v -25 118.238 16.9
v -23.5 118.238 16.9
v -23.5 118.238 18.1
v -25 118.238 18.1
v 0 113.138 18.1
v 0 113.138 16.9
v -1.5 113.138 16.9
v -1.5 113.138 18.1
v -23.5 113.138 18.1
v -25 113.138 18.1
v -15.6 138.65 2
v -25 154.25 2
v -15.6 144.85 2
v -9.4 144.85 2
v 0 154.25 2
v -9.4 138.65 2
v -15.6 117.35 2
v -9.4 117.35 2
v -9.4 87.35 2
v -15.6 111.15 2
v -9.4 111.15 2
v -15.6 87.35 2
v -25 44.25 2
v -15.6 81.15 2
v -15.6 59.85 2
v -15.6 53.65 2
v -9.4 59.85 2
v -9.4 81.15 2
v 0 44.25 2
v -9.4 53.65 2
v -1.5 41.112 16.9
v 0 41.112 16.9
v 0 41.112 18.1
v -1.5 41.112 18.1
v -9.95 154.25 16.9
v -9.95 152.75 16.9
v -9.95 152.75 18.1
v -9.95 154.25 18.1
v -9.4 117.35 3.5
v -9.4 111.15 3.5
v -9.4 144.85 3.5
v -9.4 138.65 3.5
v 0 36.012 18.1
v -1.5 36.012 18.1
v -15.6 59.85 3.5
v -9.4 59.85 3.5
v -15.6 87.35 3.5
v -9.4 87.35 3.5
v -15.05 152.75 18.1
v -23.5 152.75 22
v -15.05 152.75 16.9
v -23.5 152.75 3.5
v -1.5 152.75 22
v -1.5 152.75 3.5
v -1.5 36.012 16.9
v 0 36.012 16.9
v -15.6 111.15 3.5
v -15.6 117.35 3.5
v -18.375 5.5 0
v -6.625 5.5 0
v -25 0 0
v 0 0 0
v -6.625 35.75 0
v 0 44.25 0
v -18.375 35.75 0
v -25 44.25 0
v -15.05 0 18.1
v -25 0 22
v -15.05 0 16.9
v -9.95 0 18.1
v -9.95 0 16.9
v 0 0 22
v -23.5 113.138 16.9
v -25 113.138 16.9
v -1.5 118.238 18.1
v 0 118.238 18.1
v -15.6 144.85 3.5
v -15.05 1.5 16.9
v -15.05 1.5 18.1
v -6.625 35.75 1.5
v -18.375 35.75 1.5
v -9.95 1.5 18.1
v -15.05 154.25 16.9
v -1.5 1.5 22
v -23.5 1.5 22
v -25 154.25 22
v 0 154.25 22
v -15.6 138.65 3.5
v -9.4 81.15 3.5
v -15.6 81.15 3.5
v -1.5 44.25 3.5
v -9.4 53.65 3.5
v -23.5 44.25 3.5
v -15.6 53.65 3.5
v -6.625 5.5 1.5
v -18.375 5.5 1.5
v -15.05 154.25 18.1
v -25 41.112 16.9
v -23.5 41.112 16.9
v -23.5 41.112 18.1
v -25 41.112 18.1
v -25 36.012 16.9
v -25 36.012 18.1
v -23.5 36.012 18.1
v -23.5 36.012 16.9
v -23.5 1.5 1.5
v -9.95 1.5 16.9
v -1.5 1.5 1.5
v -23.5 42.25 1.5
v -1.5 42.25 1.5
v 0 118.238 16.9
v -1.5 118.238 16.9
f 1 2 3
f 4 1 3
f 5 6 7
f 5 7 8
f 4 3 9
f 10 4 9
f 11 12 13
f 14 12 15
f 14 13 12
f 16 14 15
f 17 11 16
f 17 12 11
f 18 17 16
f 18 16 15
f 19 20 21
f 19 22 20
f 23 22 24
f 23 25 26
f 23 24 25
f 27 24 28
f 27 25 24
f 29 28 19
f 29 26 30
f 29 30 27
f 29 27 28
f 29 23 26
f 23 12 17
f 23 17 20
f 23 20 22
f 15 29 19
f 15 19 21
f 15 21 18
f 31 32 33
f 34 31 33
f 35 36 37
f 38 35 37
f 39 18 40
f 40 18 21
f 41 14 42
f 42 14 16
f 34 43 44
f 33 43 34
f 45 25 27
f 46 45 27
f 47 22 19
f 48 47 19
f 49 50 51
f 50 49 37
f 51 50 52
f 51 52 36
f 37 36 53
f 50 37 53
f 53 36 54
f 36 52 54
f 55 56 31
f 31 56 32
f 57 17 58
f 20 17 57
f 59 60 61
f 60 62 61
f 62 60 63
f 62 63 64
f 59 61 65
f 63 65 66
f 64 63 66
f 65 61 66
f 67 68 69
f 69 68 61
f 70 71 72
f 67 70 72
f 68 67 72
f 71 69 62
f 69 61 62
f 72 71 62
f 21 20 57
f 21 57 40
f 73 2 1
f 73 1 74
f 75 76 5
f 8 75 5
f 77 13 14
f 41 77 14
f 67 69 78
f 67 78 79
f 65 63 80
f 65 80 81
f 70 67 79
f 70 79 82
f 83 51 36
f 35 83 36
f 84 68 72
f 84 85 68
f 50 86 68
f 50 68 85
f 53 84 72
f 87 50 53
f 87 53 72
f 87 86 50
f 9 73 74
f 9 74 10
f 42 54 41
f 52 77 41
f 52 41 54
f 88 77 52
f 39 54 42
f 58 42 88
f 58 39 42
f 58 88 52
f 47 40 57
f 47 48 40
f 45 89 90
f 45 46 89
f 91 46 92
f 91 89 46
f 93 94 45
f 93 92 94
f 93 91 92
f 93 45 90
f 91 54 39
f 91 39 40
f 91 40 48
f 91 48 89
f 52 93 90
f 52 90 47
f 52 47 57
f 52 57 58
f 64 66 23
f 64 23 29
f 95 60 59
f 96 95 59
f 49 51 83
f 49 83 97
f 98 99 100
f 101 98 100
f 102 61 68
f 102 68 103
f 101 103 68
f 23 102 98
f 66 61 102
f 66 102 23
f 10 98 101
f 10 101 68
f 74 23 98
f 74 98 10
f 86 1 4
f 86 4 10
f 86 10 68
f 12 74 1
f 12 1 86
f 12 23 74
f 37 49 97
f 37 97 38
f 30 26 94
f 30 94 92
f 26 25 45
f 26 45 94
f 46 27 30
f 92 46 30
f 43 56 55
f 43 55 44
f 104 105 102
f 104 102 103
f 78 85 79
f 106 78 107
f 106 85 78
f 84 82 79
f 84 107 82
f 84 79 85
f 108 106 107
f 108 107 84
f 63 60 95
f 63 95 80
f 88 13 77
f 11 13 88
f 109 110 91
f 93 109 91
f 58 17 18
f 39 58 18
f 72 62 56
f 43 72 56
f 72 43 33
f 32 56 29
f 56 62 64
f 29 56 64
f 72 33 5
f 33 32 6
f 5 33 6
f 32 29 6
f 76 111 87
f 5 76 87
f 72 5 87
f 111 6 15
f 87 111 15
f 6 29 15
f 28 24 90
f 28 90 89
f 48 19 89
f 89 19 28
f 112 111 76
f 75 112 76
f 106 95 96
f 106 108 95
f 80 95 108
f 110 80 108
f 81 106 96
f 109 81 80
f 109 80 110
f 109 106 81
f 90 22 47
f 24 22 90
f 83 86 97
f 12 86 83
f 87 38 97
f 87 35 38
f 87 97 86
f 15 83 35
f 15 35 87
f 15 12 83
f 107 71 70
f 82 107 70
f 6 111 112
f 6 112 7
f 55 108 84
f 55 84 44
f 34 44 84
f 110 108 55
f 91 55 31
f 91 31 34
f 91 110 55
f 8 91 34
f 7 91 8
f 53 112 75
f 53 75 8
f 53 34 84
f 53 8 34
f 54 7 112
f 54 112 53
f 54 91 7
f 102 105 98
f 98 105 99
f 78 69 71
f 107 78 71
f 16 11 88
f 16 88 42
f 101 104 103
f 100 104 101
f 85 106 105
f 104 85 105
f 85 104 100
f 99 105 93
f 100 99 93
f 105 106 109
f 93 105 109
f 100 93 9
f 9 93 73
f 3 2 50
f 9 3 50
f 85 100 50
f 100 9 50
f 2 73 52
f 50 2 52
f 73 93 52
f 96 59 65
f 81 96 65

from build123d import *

# Parameters (mm, degrees)
SKETCH2_W           = 44.25
SKETCH2_H           = 25
SKETCH2_W_2         = 30.25
SKETCH2_H_2         = 11.75
BOSS_EXTRUDE1_DEPTH = 1.5
SKETCH3_W           = 25
SKETCH3_H           = 2
BOSS_EXTRUDE2_DEPTH = 110
BOSS_EXTRUDE3_DEPTH = 25
BOSS_EXTRUDE4_DEPTH = 7.3
SKETCH6_W           = 1.5
SKETCH6_H           = 7.3
BOSS_EXTRUDE5_DEPTH = 112
SKETCH8_W           = 1.5
SKETCH8_H           = 5.3
BOSS_EXTRUDE6_DEPTH = 22
SKETCH9_W           = 6.2
SKETCH9_H           = 6.2
CUT_EXTRUDE1_DEPTH  = 2
SKETCH10_W          = 25
SKETCH10_H          = 110
CUT_EXTRUDE2_DEPTH  = 0.5
SKETCH11_W          = 25
SKETCH11_H          = 154.25
SKETCH11_W_2        = 22
SKETCH11_H_2        = 151.25
BOSS_EXTRUDE7_DEPTH = 13.2
SKETCH12_W          = 5.1
SKETCH12_H          = 1.2
CUT_EXTRUDE3_DEPTH  = 158.803873527
SKETCH13_W          = 5.1
SKETCH13_H          = 1.2
CUT_EXTRUDE4_DEPTH  = 158.803873527


with BuildPart() as part:
    # Sketch2 → Boss-Extrude1 (new body)
    with BuildSketch(Plane(origin=(0, 0, 0), x_dir=(0, 1, 0), z_dir=(0, 0, 1))):
        with Locations((22.125, 12.5)):
            Rectangle(SKETCH2_W, SKETCH2_H)
        with Locations((20.625, 12.5)):
            Rectangle(SKETCH2_W_2, SKETCH2_H_2, mode=Mode.SUBTRACT)
    extrude(amount=BOSS_EXTRUDE1_DEPTH)



with BuildPart() as body_2:
    # Sketch3 → Boss-Extrude2 (new body)
    with BuildSketch(Plane(origin=(0, 44.25, 0), x_dir=(-1, 0, 0), z_dir=(0, 1, 0))):
        with Locations((12.5, 2.5)):
            Rectangle(SKETCH3_W, SKETCH3_H)
    extrude(amount=BOSS_EXTRUDE2_DEPTH)


with BuildPart() as part_1:
    add(part.part)

    add(body_2.part)  # Boss-Extrude3 merges body 2
    # Sketch4 → Boss-Extrude3 (add)
    with BuildSketch(Plane.YZ):
        Polygon((44.25, 3.5), (44.25, 1.5), (42.25, 1.5), align=None)
    extrude(amount=-BOSS_EXTRUDE3_DEPTH)

    # Sketch5 → Boss-Extrude4 (add)
    with BuildSketch(Plane.XY.offset(1.5)):
        Polygon((-1.5, 42.25), (-1.5, 1.5), (-23.5, 1.5), (-23.5, 42.25), (-25, 42.25), (-25, 0), (0, 0), (0, 42.25), align=None)
    extrude(amount=BOSS_EXTRUDE4_DEPTH)

    # Sketch6 → Boss-Extrude5 (add)
    with BuildSketch(Plane(origin=(0, 42.25, 0), x_dir=(-1, 0, 0), z_dir=(0, 1, 0))):
        with Locations((24.25, 5.15)):
            Rectangle(SKETCH6_W, SKETCH6_H)
        with Locations((0.75, 5.15)):
            Rectangle(SKETCH6_W, SKETCH6_H)
    extrude(amount=BOSS_EXTRUDE5_DEPTH)

    # Sketch8 → Boss-Extrude6 (add)
    with BuildSketch(Plane.YZ.offset(-23.5)):
        with Locations((153.5, 6.15)):
            Rectangle(SKETCH8_W, SKETCH8_H)
    extrude(amount=BOSS_EXTRUDE6_DEPTH)

    # Sketch9 → Cut-Extrude1 (cut)
    with BuildSketch(Plane(origin=(0, 0, 1.5), x_dir=(1, 0, 0), z_dir=(0, 0, -1))):
        with Locations((-12.5, -141.75)):
            Rectangle(SKETCH9_W, SKETCH9_H)
        with Locations((-12.5, -114.25)):
            Rectangle(SKETCH9_W, SKETCH9_H)
        with Locations((-12.5, -56.75)):
            Rectangle(SKETCH9_W, SKETCH9_H)
        with Locations((-12.5, -84.25)):
            Rectangle(SKETCH9_W, SKETCH9_H)
    extrude(amount=-CUT_EXTRUDE1_DEPTH, mode=Mode.SUBTRACT)

    # Sketch10 → Cut-Extrude2 (cut)
    with BuildSketch(Plane(origin=(0, 0, 1.5), x_dir=(1, 0, 0), z_dir=(0, 0, -1))):
        with Locations((-12.5, -99.25)):
            Rectangle(SKETCH10_W, SKETCH10_H)
    extrude(amount=-CUT_EXTRUDE2_DEPTH, mode=Mode.SUBTRACT)

    # Sketch11 → Boss-Extrude7 (add)
    with BuildSketch(Plane.XY.offset(8.8)):
        with Locations((-12.5, 77.125)):
            Rectangle(SKETCH11_W, SKETCH11_H)
        with Locations((-12.5, 77.125)):
            Rectangle(SKETCH11_W_2, SKETCH11_H_2, mode=Mode.SUBTRACT)
    extrude(amount=BOSS_EXTRUDE7_DEPTH)

    # Sketch12 → Cut-Extrude3 (cut, through all)
    with BuildSketch(Plane.XZ):
        with Locations((-12.5, 17.5)):
            Rectangle(SKETCH12_W, SKETCH12_H)
    extrude(amount=-CUT_EXTRUDE3_DEPTH, mode=Mode.SUBTRACT)

    # Sketch13 → Cut-Extrude4 (cut, through all)
    with BuildSketch(Plane.YZ):
        with Locations((38.5625, 17.5)):
            Rectangle(SKETCH13_W, SKETCH13_H)
    cut_extrude4 = extrude(amount=-CUT_EXTRUDE4_DEPTH, mode=Mode.SUBTRACT)

    # Mirror1: Cut-Extrude4 across plane
    add(cut_extrude4.mirror(Plane(origin=(0, 77.125, 0), x_dir=(0, 0, 1), z_dir=(0, -1, 0))), mode=Mode.SUBTRACT)


solid = part_1.part
